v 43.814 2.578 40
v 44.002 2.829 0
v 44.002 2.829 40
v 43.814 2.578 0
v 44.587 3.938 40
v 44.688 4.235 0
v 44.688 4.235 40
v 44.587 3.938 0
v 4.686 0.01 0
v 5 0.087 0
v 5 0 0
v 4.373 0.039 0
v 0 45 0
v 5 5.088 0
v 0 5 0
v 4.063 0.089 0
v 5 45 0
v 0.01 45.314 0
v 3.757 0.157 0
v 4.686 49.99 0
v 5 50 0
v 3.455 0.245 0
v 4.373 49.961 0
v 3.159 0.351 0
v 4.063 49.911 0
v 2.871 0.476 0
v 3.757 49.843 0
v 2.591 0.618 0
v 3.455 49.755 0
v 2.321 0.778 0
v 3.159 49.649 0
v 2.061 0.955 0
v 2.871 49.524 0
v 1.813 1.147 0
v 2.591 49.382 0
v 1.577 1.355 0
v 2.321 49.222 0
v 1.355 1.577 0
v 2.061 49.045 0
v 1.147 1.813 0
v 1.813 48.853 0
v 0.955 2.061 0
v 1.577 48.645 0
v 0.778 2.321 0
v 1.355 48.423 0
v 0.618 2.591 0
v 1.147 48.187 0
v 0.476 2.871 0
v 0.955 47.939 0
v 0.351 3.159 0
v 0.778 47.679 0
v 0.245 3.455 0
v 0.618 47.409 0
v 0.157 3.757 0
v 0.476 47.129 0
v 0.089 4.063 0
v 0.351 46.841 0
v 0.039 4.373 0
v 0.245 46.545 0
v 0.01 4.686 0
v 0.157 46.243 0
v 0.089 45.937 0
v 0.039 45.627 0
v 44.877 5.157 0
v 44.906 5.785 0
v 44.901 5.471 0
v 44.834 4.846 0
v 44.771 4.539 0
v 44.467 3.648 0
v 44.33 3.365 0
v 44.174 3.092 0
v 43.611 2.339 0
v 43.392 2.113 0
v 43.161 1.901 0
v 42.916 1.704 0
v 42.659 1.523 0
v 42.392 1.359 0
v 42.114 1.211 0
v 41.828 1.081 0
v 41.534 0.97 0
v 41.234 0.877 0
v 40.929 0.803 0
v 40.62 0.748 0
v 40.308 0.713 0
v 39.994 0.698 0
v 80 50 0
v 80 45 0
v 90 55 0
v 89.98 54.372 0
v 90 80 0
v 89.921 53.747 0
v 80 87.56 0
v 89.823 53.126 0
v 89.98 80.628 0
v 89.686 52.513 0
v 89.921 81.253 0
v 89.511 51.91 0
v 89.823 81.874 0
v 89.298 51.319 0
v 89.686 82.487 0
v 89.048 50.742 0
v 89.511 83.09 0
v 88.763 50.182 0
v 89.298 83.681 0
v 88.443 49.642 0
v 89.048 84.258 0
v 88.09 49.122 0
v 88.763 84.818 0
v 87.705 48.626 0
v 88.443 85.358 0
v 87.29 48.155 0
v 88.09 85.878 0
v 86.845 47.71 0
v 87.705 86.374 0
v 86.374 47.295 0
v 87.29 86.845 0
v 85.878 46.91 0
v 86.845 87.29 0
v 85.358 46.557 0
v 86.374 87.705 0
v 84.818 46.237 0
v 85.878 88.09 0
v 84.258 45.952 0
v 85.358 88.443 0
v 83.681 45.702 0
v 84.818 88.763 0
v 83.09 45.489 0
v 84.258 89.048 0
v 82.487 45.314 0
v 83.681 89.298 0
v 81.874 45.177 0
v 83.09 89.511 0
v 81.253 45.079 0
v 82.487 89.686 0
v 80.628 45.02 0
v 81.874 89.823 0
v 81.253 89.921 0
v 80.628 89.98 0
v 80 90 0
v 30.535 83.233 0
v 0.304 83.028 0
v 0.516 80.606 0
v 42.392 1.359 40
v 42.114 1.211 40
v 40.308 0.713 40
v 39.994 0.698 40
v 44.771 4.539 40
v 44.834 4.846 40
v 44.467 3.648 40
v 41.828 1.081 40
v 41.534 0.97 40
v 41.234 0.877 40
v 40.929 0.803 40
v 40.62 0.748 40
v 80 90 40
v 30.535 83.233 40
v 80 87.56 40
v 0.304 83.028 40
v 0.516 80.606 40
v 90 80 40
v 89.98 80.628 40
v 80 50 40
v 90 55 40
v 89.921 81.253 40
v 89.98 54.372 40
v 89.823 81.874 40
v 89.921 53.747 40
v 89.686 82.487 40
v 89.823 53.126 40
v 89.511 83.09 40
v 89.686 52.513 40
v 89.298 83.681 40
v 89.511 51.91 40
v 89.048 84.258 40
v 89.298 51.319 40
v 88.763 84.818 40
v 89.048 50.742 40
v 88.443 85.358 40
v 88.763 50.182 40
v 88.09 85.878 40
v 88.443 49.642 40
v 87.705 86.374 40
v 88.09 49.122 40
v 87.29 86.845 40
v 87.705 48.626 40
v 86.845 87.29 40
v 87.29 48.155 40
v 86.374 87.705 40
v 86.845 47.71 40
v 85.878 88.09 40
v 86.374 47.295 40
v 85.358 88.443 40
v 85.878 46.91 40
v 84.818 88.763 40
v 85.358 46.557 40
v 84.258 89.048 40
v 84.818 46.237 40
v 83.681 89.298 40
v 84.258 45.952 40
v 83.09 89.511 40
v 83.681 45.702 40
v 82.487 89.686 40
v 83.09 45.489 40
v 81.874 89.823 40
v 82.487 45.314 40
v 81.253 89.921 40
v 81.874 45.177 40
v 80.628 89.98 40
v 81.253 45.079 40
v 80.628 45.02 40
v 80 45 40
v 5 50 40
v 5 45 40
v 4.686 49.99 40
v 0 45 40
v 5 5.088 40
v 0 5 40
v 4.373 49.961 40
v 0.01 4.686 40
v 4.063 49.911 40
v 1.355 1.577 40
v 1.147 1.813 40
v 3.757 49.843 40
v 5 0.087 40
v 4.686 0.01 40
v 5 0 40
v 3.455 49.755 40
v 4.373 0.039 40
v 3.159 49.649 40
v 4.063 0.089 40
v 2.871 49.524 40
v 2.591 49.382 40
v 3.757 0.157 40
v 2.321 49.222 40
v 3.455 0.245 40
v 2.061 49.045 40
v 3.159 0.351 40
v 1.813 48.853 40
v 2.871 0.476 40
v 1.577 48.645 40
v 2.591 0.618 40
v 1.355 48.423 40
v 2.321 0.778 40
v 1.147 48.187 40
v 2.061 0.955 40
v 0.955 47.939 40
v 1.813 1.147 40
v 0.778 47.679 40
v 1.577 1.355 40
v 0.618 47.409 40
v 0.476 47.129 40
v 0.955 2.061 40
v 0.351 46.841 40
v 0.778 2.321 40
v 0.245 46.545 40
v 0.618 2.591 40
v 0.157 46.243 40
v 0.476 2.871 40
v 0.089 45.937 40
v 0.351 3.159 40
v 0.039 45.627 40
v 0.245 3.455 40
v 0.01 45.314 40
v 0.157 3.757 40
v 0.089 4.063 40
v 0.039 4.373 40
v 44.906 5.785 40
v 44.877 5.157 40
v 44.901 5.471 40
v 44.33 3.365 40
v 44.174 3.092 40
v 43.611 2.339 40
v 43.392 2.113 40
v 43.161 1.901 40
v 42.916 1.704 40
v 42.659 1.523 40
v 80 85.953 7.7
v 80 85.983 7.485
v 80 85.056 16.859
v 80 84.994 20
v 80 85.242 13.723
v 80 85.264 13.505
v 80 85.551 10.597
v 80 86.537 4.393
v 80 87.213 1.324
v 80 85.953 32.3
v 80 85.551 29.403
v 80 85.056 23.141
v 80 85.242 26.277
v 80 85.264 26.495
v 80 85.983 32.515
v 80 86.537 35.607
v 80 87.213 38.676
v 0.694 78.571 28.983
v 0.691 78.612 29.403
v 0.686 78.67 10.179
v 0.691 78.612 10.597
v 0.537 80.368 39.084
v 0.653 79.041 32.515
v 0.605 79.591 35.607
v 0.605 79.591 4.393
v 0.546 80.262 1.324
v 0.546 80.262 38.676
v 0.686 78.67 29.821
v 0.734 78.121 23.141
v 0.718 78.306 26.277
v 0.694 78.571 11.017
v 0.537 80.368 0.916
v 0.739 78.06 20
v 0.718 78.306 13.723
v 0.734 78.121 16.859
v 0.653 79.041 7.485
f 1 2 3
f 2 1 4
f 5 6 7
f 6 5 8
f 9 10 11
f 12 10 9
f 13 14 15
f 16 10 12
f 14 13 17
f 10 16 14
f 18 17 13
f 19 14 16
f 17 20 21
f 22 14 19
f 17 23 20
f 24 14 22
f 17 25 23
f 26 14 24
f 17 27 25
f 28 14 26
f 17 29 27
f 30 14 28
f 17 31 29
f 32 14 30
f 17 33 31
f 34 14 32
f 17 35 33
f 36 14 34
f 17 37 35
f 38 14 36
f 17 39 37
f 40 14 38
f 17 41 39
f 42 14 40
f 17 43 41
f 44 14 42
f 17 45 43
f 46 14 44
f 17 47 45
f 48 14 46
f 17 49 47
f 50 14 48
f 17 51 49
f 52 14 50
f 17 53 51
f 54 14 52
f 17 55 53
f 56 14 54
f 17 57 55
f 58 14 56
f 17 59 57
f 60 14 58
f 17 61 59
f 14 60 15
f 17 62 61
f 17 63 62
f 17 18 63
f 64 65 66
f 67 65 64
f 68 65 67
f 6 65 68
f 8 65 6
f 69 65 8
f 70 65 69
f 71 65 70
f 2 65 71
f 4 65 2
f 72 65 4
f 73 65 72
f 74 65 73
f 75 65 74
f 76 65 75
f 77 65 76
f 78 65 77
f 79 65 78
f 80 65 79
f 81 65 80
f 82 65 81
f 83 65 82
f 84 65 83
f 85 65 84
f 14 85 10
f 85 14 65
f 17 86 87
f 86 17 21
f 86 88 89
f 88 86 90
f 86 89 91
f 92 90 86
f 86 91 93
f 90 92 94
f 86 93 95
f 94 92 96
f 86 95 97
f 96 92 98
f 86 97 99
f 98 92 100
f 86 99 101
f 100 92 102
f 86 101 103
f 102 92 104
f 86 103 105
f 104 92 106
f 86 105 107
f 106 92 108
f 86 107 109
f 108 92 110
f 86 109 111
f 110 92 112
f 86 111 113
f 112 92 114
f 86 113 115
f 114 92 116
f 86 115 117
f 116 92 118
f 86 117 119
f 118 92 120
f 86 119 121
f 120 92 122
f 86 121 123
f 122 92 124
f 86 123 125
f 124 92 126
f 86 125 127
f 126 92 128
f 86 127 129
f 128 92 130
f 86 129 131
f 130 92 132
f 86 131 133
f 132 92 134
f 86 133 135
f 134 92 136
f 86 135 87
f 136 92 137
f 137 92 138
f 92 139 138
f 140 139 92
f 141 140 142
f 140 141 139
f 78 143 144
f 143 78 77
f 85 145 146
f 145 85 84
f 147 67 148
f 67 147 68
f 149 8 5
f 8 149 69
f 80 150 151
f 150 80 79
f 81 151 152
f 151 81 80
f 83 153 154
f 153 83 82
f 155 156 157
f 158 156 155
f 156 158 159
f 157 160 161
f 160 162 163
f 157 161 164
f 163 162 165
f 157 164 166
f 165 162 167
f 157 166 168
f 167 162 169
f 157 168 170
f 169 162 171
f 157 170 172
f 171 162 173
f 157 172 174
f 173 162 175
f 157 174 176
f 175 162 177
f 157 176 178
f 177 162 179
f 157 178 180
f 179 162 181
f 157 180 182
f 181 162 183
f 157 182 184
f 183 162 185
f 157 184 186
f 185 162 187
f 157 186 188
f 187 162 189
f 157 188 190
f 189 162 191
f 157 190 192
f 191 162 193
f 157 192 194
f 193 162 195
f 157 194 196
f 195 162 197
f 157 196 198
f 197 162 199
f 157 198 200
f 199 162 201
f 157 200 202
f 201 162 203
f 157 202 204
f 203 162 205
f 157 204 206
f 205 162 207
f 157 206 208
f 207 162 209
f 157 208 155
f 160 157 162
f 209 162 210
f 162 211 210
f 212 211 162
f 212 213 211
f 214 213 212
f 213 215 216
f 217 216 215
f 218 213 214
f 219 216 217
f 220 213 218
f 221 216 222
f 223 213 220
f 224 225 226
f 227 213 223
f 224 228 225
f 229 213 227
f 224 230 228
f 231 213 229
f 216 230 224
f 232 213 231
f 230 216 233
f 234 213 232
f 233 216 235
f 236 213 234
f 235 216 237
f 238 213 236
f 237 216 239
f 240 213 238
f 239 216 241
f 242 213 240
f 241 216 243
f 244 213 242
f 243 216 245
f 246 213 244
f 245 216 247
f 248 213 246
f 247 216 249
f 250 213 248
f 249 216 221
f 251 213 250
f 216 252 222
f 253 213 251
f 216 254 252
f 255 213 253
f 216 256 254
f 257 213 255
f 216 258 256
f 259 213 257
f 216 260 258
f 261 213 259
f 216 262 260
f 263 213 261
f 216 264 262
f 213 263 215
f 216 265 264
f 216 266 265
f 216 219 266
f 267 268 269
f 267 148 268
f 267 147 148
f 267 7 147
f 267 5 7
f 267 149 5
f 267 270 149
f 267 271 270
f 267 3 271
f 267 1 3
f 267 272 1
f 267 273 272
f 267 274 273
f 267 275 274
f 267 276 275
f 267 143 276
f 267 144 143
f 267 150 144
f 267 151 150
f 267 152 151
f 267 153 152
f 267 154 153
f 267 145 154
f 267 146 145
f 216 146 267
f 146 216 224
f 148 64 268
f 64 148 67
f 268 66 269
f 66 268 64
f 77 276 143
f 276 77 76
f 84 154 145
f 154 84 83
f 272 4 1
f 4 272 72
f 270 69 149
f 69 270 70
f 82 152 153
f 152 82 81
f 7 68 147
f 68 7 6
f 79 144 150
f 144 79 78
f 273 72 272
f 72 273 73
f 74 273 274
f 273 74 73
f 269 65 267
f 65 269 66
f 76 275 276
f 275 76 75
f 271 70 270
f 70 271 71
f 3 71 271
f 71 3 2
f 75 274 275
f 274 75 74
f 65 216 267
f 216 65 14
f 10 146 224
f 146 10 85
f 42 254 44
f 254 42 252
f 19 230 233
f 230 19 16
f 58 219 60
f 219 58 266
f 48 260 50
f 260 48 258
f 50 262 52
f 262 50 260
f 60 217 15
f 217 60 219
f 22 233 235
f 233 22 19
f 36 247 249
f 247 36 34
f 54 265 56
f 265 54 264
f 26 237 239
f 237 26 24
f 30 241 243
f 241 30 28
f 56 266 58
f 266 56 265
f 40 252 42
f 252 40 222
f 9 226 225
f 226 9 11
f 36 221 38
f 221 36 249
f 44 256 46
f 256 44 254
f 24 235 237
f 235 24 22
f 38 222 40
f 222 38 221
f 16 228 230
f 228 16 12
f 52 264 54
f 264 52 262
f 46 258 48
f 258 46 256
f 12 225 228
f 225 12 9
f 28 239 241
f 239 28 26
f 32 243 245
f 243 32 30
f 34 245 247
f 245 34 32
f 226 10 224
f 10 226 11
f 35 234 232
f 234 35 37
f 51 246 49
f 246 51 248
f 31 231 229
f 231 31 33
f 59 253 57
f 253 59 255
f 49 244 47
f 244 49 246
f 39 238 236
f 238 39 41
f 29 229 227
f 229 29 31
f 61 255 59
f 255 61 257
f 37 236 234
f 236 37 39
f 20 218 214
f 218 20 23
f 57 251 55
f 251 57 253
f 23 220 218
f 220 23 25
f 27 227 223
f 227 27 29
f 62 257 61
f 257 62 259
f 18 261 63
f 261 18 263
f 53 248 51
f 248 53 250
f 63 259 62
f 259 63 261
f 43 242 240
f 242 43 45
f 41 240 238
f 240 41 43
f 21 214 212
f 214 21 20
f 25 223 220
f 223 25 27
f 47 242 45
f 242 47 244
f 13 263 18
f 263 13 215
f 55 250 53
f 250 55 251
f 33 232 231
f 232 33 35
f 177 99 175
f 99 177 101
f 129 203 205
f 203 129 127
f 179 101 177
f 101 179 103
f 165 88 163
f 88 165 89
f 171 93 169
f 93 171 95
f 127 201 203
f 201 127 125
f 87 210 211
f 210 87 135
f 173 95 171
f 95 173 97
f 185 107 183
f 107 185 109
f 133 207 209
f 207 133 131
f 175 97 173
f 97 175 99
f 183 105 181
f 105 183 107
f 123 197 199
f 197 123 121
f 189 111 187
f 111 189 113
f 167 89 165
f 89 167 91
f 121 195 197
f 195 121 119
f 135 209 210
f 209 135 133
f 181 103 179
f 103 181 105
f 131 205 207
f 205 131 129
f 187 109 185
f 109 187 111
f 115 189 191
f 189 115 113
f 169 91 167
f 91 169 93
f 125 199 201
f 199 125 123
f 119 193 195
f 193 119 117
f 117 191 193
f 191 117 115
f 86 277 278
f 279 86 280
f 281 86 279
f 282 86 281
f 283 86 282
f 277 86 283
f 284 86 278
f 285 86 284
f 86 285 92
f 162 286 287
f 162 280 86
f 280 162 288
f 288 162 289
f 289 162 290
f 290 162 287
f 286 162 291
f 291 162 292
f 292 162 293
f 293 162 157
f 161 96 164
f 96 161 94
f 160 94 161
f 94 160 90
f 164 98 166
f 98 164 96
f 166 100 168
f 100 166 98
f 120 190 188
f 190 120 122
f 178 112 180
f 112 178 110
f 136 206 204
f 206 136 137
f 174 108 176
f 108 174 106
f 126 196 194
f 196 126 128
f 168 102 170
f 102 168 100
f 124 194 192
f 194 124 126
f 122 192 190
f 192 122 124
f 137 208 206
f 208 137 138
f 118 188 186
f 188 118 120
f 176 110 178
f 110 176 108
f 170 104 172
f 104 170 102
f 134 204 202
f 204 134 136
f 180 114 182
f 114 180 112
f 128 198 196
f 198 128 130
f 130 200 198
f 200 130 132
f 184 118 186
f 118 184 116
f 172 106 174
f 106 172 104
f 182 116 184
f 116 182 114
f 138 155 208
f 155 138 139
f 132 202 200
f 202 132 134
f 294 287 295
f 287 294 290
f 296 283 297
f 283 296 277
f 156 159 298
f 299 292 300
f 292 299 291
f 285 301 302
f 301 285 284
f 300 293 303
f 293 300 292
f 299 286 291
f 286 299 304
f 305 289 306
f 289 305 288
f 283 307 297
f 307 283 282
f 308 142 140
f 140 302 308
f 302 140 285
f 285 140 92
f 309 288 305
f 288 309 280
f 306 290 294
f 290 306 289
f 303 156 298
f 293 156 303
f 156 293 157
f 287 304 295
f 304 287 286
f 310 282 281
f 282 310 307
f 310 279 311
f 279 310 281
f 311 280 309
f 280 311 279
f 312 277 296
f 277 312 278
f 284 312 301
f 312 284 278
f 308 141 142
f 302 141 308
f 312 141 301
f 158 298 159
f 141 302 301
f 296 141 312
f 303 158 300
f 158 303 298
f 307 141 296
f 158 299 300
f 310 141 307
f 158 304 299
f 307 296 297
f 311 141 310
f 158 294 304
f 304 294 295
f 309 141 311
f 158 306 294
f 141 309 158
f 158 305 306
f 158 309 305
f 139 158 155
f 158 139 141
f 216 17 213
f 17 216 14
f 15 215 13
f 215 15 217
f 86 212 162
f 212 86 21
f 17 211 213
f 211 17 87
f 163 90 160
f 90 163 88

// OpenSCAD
//How thick is your Desk (in mm)?
thickness_of_desk = 40;
//How wide should the Headphoneholder be (in mm)?
width = 40;//[10:80]
//How thick is the Headband of your Headset?
thickness_of_headset = 30;


rha = width*2; //Radius Headset Auflage

//Tischklemme+Rundung
rotate([0,0,1]){
    translate([5,0,0]){
    cube([35,5,width]);
        translate([35,5,0]){
            intersection(){
                cylinder(width,5,5,$fn=100);
                translate([0,-5,0]){
                    cube([5,5,width]);
                }
            }
        }
    }
}

//Rundung Ecke Tischklemme/thickness_of_desknabstand
translate([5,5,0]){
    intersection(){
        cylinder(width,5,5,$fn=100);
        translate([-5,-5,0]){
            cube([5,5,width]);
        }
    }
}

//thickness_of_desknabstand
translate([0,5,0]){
    cube([5,thickness_of_desk,width]);
}

//Rundung Ecke thickness_of_desknabstand/langes Ding
translate([5,thickness_of_desk+5,0]){
    intersection(){
        cylinder(width,5,5,$fn=100);
        translate([-5,0,0]){
            cube([5,5,width]);
        }
    }
}

//Langes Ding
translate([5,5+thickness_of_desk,0]){
    cube([75,5,width]);
}

//Rundung langes Ding/Headsetabstand
translate([80,15+thickness_of_desk,0]){
    intersection(){
        cylinder(width,10,10,$fn=100);
        translate([0,-10,0]){
            cube([10,10,width]);
        }
    }
}

//Headset abstand
translate([80,15+thickness_of_desk,0]){
    cube([10,thickness_of_headset-5,width]);
}

//Rundung Headsetabstand/auflage
translate([80,thickness_of_headset+10+thickness_of_desk,0]){
    intersection(){
        cylinder(width,10,10,$fn=100);
        translate([0,0,0]){
            cube([10,10,width]);
        }
    }
}

//Headset Auflage 4,5DEG
translate([80,thickness_of_headset+20+thickness_of_desk,0]){
    intersection(){
        translate([0,rha-4.7,width/2]){
            rotate([0,-90,5]){
                cylinder(100,rha,rha,$fn=rha*2);
            }
        }
        rotate([0,0,185]){
            cube([80,5,width]);
        }
    }
}
